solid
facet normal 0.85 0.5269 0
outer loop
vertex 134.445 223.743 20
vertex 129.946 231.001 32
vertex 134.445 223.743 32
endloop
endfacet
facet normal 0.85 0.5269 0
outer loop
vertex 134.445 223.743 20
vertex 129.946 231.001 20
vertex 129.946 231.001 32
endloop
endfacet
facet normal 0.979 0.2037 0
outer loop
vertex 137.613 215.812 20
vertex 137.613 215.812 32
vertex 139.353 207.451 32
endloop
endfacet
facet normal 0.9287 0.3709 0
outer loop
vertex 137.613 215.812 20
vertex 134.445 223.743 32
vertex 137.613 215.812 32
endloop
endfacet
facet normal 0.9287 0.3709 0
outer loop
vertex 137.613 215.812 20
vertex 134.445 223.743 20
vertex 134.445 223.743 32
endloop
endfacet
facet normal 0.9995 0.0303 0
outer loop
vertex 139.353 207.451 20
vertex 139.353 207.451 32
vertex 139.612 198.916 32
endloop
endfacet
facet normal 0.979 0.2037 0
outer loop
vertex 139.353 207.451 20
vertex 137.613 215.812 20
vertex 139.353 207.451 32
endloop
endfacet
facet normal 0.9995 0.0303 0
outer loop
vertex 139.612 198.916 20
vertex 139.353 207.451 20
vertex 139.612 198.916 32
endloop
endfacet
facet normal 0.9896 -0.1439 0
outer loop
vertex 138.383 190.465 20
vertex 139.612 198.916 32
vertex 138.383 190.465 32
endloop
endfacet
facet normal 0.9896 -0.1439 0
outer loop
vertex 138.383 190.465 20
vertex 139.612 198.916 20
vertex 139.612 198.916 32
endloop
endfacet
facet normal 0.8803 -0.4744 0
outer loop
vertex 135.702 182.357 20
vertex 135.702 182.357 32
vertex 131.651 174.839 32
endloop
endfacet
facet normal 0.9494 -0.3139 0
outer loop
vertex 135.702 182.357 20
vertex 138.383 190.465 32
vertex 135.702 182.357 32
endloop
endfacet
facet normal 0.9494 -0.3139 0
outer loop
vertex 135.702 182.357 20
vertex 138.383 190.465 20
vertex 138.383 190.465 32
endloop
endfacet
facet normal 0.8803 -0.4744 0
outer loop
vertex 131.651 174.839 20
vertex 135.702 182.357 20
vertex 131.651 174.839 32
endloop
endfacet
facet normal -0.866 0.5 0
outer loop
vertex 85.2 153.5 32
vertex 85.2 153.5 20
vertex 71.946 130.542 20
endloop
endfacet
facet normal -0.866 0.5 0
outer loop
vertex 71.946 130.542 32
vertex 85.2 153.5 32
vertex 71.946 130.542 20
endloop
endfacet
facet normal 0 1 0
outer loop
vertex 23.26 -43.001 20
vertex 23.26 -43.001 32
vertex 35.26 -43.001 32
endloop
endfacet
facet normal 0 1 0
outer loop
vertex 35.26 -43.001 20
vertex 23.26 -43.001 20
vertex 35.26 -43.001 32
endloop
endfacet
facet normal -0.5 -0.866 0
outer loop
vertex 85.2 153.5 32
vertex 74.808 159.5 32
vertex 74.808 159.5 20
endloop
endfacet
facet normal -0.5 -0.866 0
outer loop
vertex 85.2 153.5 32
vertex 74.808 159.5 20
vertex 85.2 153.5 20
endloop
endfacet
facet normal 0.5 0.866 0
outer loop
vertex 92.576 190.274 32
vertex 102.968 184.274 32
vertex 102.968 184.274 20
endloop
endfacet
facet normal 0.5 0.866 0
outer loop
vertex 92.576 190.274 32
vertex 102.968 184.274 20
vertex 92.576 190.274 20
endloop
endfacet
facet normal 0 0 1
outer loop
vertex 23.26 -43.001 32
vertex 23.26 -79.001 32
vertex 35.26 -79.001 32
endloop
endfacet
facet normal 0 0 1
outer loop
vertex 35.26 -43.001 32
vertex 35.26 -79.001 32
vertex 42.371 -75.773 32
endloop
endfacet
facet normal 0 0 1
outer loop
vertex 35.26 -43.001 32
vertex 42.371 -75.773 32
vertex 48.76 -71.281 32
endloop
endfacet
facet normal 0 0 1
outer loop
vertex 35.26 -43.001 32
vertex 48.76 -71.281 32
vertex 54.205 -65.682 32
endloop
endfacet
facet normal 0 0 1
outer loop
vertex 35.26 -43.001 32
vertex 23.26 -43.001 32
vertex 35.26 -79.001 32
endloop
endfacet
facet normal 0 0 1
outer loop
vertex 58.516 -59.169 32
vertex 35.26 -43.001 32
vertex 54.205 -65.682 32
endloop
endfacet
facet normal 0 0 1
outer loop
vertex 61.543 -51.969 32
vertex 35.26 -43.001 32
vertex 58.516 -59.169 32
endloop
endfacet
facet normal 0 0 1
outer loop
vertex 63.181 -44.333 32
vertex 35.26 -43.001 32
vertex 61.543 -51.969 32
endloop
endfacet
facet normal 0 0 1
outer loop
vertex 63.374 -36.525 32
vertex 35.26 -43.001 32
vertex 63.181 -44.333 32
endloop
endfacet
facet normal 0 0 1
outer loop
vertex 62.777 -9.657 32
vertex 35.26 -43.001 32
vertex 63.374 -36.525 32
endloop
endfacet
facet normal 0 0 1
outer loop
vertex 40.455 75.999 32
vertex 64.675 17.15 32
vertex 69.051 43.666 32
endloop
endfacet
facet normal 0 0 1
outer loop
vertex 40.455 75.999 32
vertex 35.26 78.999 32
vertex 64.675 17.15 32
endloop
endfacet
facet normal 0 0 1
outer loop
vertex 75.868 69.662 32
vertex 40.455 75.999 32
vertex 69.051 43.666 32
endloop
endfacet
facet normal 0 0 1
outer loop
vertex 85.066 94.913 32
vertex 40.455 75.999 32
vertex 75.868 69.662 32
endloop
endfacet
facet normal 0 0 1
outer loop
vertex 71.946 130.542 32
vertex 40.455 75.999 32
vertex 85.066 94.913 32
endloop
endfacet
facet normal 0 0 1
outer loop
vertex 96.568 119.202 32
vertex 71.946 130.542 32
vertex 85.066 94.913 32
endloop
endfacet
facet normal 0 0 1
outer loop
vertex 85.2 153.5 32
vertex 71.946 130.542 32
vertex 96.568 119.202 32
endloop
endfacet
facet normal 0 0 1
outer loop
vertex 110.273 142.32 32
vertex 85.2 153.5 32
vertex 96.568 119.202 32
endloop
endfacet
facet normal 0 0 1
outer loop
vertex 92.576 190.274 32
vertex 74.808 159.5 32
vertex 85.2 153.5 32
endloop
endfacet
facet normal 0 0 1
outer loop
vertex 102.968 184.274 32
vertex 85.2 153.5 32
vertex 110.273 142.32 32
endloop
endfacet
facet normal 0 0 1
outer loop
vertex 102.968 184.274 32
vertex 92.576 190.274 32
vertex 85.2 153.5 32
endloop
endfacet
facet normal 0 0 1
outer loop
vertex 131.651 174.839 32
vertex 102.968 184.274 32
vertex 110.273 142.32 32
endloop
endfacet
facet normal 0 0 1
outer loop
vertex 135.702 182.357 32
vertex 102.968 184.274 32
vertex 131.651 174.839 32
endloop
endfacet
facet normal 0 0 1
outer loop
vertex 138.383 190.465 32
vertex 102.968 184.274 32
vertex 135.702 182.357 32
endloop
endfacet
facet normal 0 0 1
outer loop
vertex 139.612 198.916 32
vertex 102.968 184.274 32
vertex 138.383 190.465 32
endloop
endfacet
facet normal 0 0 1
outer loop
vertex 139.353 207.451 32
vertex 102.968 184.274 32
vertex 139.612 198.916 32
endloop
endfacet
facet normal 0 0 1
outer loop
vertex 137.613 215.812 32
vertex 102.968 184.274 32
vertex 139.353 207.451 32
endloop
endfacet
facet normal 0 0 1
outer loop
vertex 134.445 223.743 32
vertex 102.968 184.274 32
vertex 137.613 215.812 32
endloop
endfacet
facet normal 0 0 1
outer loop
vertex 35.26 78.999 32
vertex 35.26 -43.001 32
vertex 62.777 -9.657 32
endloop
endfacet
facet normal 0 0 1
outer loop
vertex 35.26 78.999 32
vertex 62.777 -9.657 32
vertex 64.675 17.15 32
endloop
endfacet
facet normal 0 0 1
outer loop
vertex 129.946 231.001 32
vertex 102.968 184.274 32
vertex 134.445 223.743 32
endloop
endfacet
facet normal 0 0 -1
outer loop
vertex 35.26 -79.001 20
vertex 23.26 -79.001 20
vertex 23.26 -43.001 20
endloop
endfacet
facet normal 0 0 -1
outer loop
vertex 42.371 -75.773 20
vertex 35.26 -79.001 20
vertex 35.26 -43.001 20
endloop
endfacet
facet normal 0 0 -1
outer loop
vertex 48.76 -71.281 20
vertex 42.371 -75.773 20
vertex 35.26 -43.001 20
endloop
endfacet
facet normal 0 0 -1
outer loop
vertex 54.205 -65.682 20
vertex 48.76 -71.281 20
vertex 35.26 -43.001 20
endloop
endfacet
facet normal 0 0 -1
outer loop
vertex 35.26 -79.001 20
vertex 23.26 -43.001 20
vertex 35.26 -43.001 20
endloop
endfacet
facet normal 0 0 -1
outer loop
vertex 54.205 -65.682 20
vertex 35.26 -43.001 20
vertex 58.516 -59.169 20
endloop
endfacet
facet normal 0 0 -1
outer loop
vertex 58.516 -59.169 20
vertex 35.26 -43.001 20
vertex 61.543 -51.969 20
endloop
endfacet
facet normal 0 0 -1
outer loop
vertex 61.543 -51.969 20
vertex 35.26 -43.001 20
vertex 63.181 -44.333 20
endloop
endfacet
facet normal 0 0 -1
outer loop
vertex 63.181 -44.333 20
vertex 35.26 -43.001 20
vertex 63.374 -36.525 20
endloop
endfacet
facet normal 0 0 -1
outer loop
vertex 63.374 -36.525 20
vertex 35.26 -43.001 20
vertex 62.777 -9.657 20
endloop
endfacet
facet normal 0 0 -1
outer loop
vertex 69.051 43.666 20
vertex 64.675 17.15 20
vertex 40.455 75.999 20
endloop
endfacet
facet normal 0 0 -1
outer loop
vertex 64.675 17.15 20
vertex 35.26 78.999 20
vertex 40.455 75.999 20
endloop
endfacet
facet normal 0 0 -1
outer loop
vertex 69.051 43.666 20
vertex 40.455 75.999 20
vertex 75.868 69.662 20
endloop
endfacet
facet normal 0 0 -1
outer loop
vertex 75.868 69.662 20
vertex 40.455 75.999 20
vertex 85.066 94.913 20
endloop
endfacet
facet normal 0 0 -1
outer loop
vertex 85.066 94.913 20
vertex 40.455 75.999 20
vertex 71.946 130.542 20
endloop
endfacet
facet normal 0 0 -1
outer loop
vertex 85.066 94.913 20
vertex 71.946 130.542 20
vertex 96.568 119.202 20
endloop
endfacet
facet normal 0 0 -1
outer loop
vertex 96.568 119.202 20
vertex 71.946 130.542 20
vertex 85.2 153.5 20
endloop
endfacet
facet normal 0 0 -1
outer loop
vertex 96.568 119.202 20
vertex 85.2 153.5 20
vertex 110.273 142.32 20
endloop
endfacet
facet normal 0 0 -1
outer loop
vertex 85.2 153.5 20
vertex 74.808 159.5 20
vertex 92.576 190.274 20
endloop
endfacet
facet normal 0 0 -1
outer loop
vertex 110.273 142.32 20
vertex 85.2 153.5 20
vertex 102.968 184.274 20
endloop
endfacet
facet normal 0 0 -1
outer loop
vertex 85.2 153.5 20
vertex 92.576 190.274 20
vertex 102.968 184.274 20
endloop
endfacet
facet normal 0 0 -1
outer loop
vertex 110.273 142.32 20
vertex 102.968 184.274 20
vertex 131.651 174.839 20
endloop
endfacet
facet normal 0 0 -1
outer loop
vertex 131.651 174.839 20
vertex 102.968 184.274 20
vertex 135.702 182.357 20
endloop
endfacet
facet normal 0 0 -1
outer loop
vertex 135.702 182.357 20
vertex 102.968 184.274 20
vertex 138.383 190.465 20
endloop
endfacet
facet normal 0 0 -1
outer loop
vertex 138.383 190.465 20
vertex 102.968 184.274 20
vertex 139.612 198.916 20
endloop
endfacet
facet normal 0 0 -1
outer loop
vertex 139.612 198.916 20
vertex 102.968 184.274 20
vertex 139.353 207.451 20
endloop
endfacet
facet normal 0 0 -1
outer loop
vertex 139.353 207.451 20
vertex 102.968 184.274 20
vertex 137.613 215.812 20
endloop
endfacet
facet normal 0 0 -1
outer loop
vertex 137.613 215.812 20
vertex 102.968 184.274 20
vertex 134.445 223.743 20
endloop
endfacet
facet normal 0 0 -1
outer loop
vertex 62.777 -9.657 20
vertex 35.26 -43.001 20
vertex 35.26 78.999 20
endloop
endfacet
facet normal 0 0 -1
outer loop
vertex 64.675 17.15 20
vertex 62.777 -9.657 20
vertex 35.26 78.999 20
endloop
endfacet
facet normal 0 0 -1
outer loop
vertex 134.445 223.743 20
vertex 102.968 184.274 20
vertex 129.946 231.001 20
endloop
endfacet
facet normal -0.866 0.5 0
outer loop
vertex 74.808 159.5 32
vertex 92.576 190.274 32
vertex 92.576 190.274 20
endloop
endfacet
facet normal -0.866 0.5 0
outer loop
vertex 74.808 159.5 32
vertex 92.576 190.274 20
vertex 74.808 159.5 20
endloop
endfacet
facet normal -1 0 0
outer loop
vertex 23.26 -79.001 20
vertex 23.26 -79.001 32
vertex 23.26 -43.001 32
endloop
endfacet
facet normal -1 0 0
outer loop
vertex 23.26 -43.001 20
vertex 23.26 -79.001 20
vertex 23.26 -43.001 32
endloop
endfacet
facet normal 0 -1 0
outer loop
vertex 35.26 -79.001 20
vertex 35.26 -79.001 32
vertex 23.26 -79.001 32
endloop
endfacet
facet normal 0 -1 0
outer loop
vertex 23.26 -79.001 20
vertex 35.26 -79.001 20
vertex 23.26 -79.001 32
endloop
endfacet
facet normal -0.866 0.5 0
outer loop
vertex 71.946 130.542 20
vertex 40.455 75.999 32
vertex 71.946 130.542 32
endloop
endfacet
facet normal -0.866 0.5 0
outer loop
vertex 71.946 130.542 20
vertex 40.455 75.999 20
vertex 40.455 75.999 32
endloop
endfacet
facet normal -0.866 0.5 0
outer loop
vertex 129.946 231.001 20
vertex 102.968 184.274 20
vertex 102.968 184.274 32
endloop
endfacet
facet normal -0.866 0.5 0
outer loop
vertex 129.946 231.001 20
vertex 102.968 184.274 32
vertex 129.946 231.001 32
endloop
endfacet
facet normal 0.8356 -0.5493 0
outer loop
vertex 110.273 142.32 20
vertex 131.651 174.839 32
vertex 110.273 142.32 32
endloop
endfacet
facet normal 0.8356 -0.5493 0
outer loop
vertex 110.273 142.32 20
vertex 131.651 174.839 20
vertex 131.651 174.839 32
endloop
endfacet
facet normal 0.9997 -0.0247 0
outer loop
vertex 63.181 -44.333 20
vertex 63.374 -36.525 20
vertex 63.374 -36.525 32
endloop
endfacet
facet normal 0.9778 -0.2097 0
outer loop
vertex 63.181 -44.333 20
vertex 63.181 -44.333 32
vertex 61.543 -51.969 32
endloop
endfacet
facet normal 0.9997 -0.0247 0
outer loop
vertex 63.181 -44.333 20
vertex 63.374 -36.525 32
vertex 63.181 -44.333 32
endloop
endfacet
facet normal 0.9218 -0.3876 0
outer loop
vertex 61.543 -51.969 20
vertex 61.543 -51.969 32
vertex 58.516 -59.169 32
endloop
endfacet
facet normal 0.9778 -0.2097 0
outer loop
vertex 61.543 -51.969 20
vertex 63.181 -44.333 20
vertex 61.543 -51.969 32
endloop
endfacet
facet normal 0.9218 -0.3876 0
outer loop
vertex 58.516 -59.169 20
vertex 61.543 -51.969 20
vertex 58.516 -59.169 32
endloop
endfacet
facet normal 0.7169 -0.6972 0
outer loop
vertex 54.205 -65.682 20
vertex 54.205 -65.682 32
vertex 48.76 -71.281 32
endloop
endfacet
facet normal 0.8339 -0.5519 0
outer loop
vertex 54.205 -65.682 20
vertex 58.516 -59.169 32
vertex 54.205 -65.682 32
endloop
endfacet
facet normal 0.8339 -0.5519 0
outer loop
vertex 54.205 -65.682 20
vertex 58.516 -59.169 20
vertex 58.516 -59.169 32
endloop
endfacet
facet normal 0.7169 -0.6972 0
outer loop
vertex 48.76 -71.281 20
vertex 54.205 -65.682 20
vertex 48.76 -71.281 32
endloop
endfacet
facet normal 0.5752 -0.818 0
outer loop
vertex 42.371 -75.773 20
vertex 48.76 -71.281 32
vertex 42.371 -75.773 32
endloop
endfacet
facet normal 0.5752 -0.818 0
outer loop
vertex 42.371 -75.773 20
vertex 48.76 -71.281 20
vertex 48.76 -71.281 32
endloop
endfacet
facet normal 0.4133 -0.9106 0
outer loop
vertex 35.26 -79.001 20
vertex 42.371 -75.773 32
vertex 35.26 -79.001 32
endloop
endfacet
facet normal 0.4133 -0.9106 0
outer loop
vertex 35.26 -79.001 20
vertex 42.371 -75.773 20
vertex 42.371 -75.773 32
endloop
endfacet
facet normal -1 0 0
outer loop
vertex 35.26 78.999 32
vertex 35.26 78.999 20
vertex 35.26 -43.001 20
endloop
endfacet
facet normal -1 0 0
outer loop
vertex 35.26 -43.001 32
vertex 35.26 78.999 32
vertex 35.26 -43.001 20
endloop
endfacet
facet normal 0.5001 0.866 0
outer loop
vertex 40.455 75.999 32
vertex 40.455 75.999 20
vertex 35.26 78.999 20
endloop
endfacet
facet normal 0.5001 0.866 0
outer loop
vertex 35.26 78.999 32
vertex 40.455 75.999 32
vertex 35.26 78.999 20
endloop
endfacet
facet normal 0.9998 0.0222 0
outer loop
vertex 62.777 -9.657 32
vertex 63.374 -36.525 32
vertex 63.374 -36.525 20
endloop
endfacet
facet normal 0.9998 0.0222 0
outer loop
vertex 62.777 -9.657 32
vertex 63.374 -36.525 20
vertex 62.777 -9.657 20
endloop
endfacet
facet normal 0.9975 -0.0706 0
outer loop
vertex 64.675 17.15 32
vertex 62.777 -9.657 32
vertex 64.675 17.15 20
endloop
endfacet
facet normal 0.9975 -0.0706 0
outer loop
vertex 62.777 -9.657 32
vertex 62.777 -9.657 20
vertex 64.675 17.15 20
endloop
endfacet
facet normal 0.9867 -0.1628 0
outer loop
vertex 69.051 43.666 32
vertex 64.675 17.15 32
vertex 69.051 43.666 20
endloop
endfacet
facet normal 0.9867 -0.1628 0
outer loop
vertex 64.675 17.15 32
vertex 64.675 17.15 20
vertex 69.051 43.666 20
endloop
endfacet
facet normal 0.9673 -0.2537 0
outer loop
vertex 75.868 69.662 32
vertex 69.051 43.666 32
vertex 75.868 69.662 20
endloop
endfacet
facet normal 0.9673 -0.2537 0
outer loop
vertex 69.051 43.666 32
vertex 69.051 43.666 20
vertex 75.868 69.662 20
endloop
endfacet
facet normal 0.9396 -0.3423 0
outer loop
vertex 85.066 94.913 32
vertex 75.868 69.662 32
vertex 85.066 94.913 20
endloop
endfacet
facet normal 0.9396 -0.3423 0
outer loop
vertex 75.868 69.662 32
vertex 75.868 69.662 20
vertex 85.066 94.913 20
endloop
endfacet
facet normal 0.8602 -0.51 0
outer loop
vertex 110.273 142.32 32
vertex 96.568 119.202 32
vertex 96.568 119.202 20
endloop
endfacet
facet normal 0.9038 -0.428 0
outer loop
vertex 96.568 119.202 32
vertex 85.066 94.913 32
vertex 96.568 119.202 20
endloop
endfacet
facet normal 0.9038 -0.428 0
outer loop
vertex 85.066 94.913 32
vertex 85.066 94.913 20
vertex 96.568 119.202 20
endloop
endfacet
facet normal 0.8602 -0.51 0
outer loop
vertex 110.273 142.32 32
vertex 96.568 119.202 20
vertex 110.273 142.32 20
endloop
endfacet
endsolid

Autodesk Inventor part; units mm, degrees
ref_plane "YZ Plane" through (0, 0, 0) normal (1, 0, 0) x (0, 1, 0)
ref_plane "XZ Plane" through (0, 0, 0) normal (0, 1, 0) x (-1, 0, 0)
ref_plane "XY Plane" through (0, 0, 0) normal (0, 0, 1) x (1, 0, 0)
ref_plane "Work Plane1" through (0, 0, 20) normal (0, 0, 1) x (1, 0, 0)
sketch "Sketch1" plane through (0, 0, 20) normal (0, 0, 1) x (1, 0, 0)
  circle A0 centre (68.2595, 214.6541) radius 4 projected
  line L0 (64.2595, -185.3459) -> (64.2595, -225.3459) projected
  arc A1 (72.2595, -185.3459) -> (64.2595, -185.3459) centre (68.2595, -185.3459) ccw projected
  line L1 (72.2595, -225.3459) -> (72.2595, -185.3459) projected
  arc A2 (64.2595, -225.3459) -> (72.2595, -225.3459) centre (68.2595, -225.3459) ccw projected
  line L2 (-101.2595, 230.5421) -> (-90.8671, 224.5421) projected
  line L3 (-90.8671, 224.5421) -> (-108.8671, 193.3652) projected
  line L4 (-108.8671, 193.3652) -> (-119.2595, 199.3652) projected
  line L5 (-137.2595, 168.1883) -> (-119.2595, 199.3652) projected
  line L6 (-137.2595, 168.1883) -> (-106.0825, 150.1883) projected
  line L7 (-106.0825, 150.1883) -> (-112.0825, 139.796) projected
  line L8 (-80.9056, 121.796) -> (-112.0825, 139.796) projected
  line L9 (-80.9056, 121.796) -> (-74.9056, 132.1883) projected
  line L10 (-74.9056, 132.1883) -> (-43.7287, 114.1883) projected
  line L11 (-43.7287, 114.1883) -> (-49.7287, 103.796) projected
  line L12 (-18.5518, 85.796) -> (-49.7287, 103.796) projected
  line L13 (-18.5518, 85.796) -> (-12.5518, 96.1883) projected
  line L14 (-12.5518, 96.1883) -> (18.6251, 78.1883) projected
  line L15 (18.6251, 78.1883) -> (12.6251, 67.796) projected
  line L16 (23.2595, 61.6562) -> (12.6251, 67.796) projected
  line L17 (23.2595, -7.001) -> (23.2595, 61.6562) projected
  line L18 (23.2595, -7.001) -> (35.2595, -7.001) projected
  line L19 (35.2595, -7.001) -> (35.2595, -43.001) projected
  line L20 (35.2595, -43.001) -> (23.2595, -43.001) projected
  line L21 (23.2595, -79.001) -> (23.2595, -43.001) projected
  line L22 (23.2595, -79.001) -> (35.2595, -79.001) projected
  line L23 (35.2595, -79.001) -> (35.2595, -115.001) projected
  line L24 (35.2595, -115.001) -> (23.2595, -115.001) projected
  line L25 (23.2595, -151.001) -> (23.2595, -115.001) projected
  line L26 (23.2595, -151.001) -> (35.2595, -151.001) projected
  line L27 (35.2595, -151.001) -> (35.2595, -187.001) projected
  line L28 (35.2595, -187.001) -> (23.2595, -187.001) projected
  line L29 (23.2595, -223.001) -> (23.2595, -187.001) projected
  line L30 (23.2595, -223.001) -> (35.2595, -223.001) projected
  line L31 (35.2595, -223.001) -> (35.2595, -259.001) projected
  line L32 (35.2595, -259.001) -> (23.2595, -259.001) projected
  line L33 (23.2595, -295.001) -> (23.2595, -259.001) projected
  line L34 (23.2595, -295.001) -> (35.2595, -295.001) projected
  line L35 (35.2595, -295.001) -> (35.2595, -331.001) projected
  line L36 (105.7595, -290.2979) -> (35.2595, -331.001) projected
  arc A3 (105.7595, -290.2979) -> (143.2595, -225.3459) centre (68.2595, -225.3459) ccw projected
  line L37 (143.2595, -185.3459) -> (143.2595, -225.3459) projected
  arc A4 (143.2595, -185.3459) -> (125.3012, -136.6505) centre (68.2595, -185.3459) ccw projected
  arc A5 (114.6586, -107.7924) -> (125.3012, -136.6505) centre (159.1055, -107.7924) ccw projected
  line L38 (114.6586, 129.2663) -> (114.6586, -107.7924) projected
  arc A6 (5.9066, 302.615) -> (62.9654, 289.467) centre (55.9066, 389.2175) ccw projected
  line L39 (-43.2595, 331.001) -> (5.9066, 302.615) projected
  line L40 (-65.2595, 292.8959) -> (-43.2595, 331.001) projected
  line L41 (-65.2595, 292.8959) -> (-54.8671, 286.8959) projected
  line L42 (-54.8671, 286.8959) -> (-72.8671, 255.719) projected
  line L43 (-72.8671, 255.719) -> (-83.2595, 261.719) projected
  line L44 (-101.2595, 230.5421) -> (-83.2595, 261.719) projected
  circle A7 centre (28.2595, 174.6541) radius 30 projected
  line L45 (71.9456, 130.5421) -> (61.5533, 136.5421) projected
  line L46 (61.5533, 136.5421) -> (79.5533, 167.719) projected
  line L47 (79.5533, 167.719) -> (89.9456, 161.719) projected
  line L48 (89.9456, 161.719) -> (71.9456, 130.5421) projected
  line L49 (40.4552, 75.9992) -> (71.9456, 130.5421) projected
  line L50 (40.4552, 75.9992) -> (30.0629, 81.9992) projected
  line L51 (30.0629, 81.9992) -> (61.5533, 136.5421) projected
  line L52 (61.5533, 136.5421) -> (71.9456, 130.5421) projected
  line L53 (40.4552, 75.9992) -> (71.9456, 130.5421) projected
  line L54 (35.2595, 78.999) -> (35.2595, -6.251) projected
  line L55 (35.2595, -6.251) -> (23.2595, -6.251) projected
  line L56 (23.2595, 78.999) -> (23.2595, -6.251) projected
  line L57 (35.2595, 78.999) -> (23.2595, 78.999) projected
  line L58 (89.9456, 161.719) -> (137.3521, 243.8295)
  line L59 (131.6514, 174.8386) -> (110.2726, 142.3196)
  arc A8 (110.2726, 142.3196) -> (63.3739, -36.5254) centre (352.1075, -16.6687) ccw
  arc A9 (35.2595, -79.001) -> (63.3739, -36.5254) centre (21.5733, -39.4001) ccw
  line L60 (119.5533, 237.001) -> (129.9456, 231.001) projected
  arc A10 (131.6514, 174.8386) -> (129.9456, 231.001) centre (90.7859, 201.7046) ccw
  circle A11 centre (68.2595, 214.6541) radius 4 projected
  line L61 (64.2595, -185.3459) -> (64.2595, -225.3459) projected
  arc A12 (72.2595, -185.3459) -> (64.2595, -185.3459) centre (68.2595, -185.3459) ccw projected
  line L62 (72.2595, -225.3459) -> (72.2595, -185.3459) projected
  arc A13 (64.2595, -225.3459) -> (72.2595, -225.3459) centre (68.2595, -225.3459) ccw projected
  line L63 (-101.2595, 230.5421) -> (-90.8671, 224.5421) projected
  line L64 (-90.8671, 224.5421) -> (-108.8671, 193.3652) projected
  line L65 (-108.8671, 193.3652) -> (-119.2595, 199.3652) projected
  line L66 (-137.2595, 168.1883) -> (-119.2595, 199.3652) projected
  line L67 (-137.2595, 168.1883) -> (-106.0825, 150.1883) projected
  line L68 (-106.0825, 150.1883) -> (-112.0825, 139.796) projected
  line L69 (-80.9056, 121.796) -> (-112.0825, 139.796) projected
  line L70 (-80.9056, 121.796) -> (-74.9056, 132.1883) projected
  line L71 (-74.9056, 132.1883) -> (-43.7287, 114.1883) projected
  line L72 (-43.7287, 114.1883) -> (-49.7287, 103.796) projected
  line L73 (-18.5518, 85.796) -> (-49.7287, 103.796) projected
  line L74 (-18.5518, 85.796) -> (-12.5518, 96.1883) projected
  line L75 (-12.5518, 96.1883) -> (18.6251, 78.1883) projected
  line L76 (18.6251, 78.1883) -> (12.6251, 67.796) projected
  line L77 (23.2595, 61.6562) -> (12.6251, 67.796) projected
  line L78 (23.2595, -7.001) -> (23.2595, 61.6562) projected
  line L79 (23.2595, -7.001) -> (35.2595, -7.001) projected
  line L80 (35.2595, -7.001) -> (35.2595, -43.001) projected
  line L81 (35.2595, -43.001) -> (23.2595, -43.001) projected
  line L82 (23.2595, -79.001) -> (23.2595, -43.001) projected
  line L83 (23.2595, -79.001) -> (35.2595, -79.001) projected
  line L84 (35.2595, -79.001) -> (35.2595, -115.001) projected
  line L85 (35.2595, -115.001) -> (23.2595, -115.001) projected
  line L86 (23.2595, -151.001) -> (23.2595, -115.001) projected
  line L87 (23.2595, -151.001) -> (35.2595, -151.001) projected
  line L88 (35.2595, -151.001) -> (35.2595, -187.001) projected
  line L89 (35.2595, -187.001) -> (23.2595, -187.001) projected
  line L90 (23.2595, -223.001) -> (23.2595, -187.001) projected
  line L91 (23.2595, -223.001) -> (35.2595, -223.001) projected
  line L92 (35.2595, -223.001) -> (35.2595, -259.001) projected
  line L93 (35.2595, -259.001) -> (23.2595, -259.001) projected
  line L94 (23.2595, -295.001) -> (23.2595, -259.001) projected
  line L95 (23.2595, -295.001) -> (35.2595, -295.001) projected
  line L96 (35.2595, -295.001) -> (35.2595, -331.001) projected
  line L97 (105.7595, -290.2979) -> (35.2595, -331.001) projected
  arc A14 (105.7595, -290.2979) -> (143.2595, -225.3459) centre (68.2595, -225.3459) ccw projected
  line L98 (143.2595, -185.3459) -> (143.2595, -225.3459) projected
  arc A15 (143.2595, -185.3459) -> (125.3012, -136.6505) centre (68.2595, -185.3459) ccw projected
  arc A16 (114.6586, -107.7924) -> (125.3012, -136.6505) centre (159.1055, -107.7924) ccw projected
  line L99 (114.6586, 129.2663) -> (114.6586, -107.7924) projected
  arc A17 (128.1281, 169.4795) -> (114.6586, 129.2663) centre (181.4216, 129.2663) ccw projected
  arc A18 (128.1281, 169.4795) -> (62.9654, 289.467) centre (68.2595, 214.6541) ccw projected
  arc A19 (5.9066, 302.615) -> (62.9654, 289.467) centre (55.9066, 389.2175) ccw projected
  line L100 (-43.2595, 331.001) -> (5.9066, 302.615) projected
  line L101 (-65.2595, 292.8959) -> (-43.2595, 331.001) projected
  line L102 (-65.2595, 292.8959) -> (-54.8671, 286.8959) projected
  line L103 (-54.8671, 286.8959) -> (-72.8671, 255.719) projected
  line L104 (-72.8671, 255.719) -> (-83.2595, 261.719) projected
  line L105 (-101.2595, 230.5421) -> (-83.2595, 261.719) projected
  circle A20 centre (28.2595, 174.6541) radius 30 projected
  line L106 (71.9456, 130.5421) -> (61.5533, 136.5421) projected
  line L107 (61.5533, 136.5421) -> (79.5533, 167.719) projected
  line L108 (79.5533, 167.719) -> (89.9456, 161.719) projected
  line L109 (89.9456, 161.719) -> (71.9456, 130.5421) projected
  line L110 (35.2595, -7.001) -> (35.2595, 3.1632)
  line L111 (35.2595, -6.251) -> (35.2595, -79.001)
  point P0 (0, 0)
extrude "Extrusion1" add sketch "Sketch1" along normal blind 12 contours A10 L59 A17 A8 A9 L111 L19 L110 L54 L50 L49 L48 L58 | L59 A17
sketch "Sketch3" plane through (0, 0, 32) normal (0, 0, 1) x (1, 0, 0)
  line L0 (35.2595, 78.999) -> (35.2595, -79.001) projected
  arc A0 (35.2595, -79.001) -> (63.3739, -36.5254) centre (21.5733, -39.4001) ccw projected
  arc A1 (110.2726, 142.3196) -> (63.3739, -36.5254) centre (352.1075, -16.6687) ccw projected
  line L1 (110.2726, 142.3196) -> (131.6514, 174.8386) projected
  arc A2 (131.6514, 174.8386) -> (129.9456, 231.001) centre (90.7859, 201.7046) ccw projected
  line L2 (129.9456, 231.001) -> (40.4552, 75.9992) projected
  line L3 (40.4552, 75.9992) -> (35.2595, 78.999) projected
  line L4 (35.2595, -79.001) -> (23.2595, -79.001)
  line L5 (23.2595, -79.001) -> (23.2595, -43.001)
  line L6 (23.2595, -43.001) -> (35.2595, -43.001)
  line L7 (35.2595, -43.001) -> (35.2595, -79.001)
  line L8 (129.9456, 231.001) -> (40.4552, 75.9992) projected
  line L9 (85.2004, 153.5001) -> (102.9679, 184.2742)
  line L10 (102.9679, 184.2742) -> (92.5755, 190.2742)
  line L11 (92.5755, 190.2742) -> (74.8081, 159.5001)
  line L12 (74.8081, 159.5001) -> (85.2004, 153.5001)
  point P0 (0, 0)
  dimension "d2" = 12
  dimension "d3" = 36
  dimension "d4" = 12
extrude "Extrusion2" add sketch "Sketch3" against normal up to surface (12 mm away) contours L0 L4 L5 L6 | L12 L11 L10 L2
sketch "Sketch4" plane through (0, 0, 32) normal (0, 0, 1) x (1, 0, 0)
  line L0 (35.2595, 78.999) -> (35.2595, -43.001) projected
  line L1 (35.2595, -43.001) -> (23.2595, -43.001) projected
  line L2 (23.2595, -43.001) -> (23.2595, -79.001) projected
  line L3 (23.2595, -79.001) -> (35.2595, -79.001) projected
  arc A0 (35.2595, -79.001) -> (63.3739, -36.5254) centre (21.5733, -39.4001) ccw projected
  arc A1 (110.2726, 142.3196) -> (63.3739, -36.5254) centre (352.1075, -16.6687) ccw projected
  line L4 (110.2726, 142.3196) -> (131.6514, 174.8386) projected
  arc A2 (131.6514, 174.8386) -> (129.9456, 231.001) centre (90.7859, 201.7046) ccw projected
  line L5 (129.9456, 231.001) -> (102.9679, 184.2742) projected
  line L6 (102.9679, 184.2742) -> (92.5755, 190.2742) projected
  line L7 (92.5755, 190.2742) -> (74.8081, 159.5001) projected
  line L8 (74.8081, 159.5001) -> (85.2004, 153.5001) projected
  line L9 (85.2004, 153.5001) -> (40.4552, 75.9992) projected
  line L10 (40.4552, 75.9992) -> (35.2595, 78.999) projected
  point P0 (0, 0)
properties part number "wooden_stiffener"
